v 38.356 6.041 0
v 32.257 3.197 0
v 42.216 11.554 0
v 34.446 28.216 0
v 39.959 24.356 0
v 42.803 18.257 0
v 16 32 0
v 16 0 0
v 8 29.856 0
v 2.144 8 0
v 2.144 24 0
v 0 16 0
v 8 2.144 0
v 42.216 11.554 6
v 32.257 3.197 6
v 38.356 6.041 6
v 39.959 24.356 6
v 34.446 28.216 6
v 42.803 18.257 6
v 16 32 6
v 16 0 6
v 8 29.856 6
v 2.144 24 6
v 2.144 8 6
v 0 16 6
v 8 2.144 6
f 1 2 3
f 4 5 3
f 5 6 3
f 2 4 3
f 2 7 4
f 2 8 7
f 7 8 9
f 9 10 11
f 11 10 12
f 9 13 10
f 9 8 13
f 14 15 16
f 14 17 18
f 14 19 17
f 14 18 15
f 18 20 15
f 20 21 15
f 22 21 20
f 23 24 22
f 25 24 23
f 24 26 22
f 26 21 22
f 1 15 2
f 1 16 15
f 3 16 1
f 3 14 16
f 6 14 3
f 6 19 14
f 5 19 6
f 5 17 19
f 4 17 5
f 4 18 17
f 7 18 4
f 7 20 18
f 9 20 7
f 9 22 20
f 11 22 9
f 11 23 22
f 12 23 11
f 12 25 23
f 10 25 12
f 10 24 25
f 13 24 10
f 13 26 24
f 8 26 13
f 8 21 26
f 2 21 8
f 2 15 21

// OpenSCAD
$fn = 32;

// ----------------------------------------------------------------------
// Eccentric disc: step, 6 mm thick
// ----------------------------------------------------------------------

// --- parameters (mm) ---
profile_height = 6;       // extrusion height
profile_points = 13;      // points of the closed outline

profile = [[0, 16], [2.144, 8], [8, 2.144], [16, 0], [32.257, 3.197], [38.356, 6.041], [42.216, 11.554], [42.803, 18.257], [39.959, 24.356], [34.446, 28.216], [16, 32], [8, 29.856], [2.144, 24]];  // single closed polygon, 13 points, counter clockwise

// --- the one profile operation ---
linear_extrude(height = profile_height) polygon(points = profile);
